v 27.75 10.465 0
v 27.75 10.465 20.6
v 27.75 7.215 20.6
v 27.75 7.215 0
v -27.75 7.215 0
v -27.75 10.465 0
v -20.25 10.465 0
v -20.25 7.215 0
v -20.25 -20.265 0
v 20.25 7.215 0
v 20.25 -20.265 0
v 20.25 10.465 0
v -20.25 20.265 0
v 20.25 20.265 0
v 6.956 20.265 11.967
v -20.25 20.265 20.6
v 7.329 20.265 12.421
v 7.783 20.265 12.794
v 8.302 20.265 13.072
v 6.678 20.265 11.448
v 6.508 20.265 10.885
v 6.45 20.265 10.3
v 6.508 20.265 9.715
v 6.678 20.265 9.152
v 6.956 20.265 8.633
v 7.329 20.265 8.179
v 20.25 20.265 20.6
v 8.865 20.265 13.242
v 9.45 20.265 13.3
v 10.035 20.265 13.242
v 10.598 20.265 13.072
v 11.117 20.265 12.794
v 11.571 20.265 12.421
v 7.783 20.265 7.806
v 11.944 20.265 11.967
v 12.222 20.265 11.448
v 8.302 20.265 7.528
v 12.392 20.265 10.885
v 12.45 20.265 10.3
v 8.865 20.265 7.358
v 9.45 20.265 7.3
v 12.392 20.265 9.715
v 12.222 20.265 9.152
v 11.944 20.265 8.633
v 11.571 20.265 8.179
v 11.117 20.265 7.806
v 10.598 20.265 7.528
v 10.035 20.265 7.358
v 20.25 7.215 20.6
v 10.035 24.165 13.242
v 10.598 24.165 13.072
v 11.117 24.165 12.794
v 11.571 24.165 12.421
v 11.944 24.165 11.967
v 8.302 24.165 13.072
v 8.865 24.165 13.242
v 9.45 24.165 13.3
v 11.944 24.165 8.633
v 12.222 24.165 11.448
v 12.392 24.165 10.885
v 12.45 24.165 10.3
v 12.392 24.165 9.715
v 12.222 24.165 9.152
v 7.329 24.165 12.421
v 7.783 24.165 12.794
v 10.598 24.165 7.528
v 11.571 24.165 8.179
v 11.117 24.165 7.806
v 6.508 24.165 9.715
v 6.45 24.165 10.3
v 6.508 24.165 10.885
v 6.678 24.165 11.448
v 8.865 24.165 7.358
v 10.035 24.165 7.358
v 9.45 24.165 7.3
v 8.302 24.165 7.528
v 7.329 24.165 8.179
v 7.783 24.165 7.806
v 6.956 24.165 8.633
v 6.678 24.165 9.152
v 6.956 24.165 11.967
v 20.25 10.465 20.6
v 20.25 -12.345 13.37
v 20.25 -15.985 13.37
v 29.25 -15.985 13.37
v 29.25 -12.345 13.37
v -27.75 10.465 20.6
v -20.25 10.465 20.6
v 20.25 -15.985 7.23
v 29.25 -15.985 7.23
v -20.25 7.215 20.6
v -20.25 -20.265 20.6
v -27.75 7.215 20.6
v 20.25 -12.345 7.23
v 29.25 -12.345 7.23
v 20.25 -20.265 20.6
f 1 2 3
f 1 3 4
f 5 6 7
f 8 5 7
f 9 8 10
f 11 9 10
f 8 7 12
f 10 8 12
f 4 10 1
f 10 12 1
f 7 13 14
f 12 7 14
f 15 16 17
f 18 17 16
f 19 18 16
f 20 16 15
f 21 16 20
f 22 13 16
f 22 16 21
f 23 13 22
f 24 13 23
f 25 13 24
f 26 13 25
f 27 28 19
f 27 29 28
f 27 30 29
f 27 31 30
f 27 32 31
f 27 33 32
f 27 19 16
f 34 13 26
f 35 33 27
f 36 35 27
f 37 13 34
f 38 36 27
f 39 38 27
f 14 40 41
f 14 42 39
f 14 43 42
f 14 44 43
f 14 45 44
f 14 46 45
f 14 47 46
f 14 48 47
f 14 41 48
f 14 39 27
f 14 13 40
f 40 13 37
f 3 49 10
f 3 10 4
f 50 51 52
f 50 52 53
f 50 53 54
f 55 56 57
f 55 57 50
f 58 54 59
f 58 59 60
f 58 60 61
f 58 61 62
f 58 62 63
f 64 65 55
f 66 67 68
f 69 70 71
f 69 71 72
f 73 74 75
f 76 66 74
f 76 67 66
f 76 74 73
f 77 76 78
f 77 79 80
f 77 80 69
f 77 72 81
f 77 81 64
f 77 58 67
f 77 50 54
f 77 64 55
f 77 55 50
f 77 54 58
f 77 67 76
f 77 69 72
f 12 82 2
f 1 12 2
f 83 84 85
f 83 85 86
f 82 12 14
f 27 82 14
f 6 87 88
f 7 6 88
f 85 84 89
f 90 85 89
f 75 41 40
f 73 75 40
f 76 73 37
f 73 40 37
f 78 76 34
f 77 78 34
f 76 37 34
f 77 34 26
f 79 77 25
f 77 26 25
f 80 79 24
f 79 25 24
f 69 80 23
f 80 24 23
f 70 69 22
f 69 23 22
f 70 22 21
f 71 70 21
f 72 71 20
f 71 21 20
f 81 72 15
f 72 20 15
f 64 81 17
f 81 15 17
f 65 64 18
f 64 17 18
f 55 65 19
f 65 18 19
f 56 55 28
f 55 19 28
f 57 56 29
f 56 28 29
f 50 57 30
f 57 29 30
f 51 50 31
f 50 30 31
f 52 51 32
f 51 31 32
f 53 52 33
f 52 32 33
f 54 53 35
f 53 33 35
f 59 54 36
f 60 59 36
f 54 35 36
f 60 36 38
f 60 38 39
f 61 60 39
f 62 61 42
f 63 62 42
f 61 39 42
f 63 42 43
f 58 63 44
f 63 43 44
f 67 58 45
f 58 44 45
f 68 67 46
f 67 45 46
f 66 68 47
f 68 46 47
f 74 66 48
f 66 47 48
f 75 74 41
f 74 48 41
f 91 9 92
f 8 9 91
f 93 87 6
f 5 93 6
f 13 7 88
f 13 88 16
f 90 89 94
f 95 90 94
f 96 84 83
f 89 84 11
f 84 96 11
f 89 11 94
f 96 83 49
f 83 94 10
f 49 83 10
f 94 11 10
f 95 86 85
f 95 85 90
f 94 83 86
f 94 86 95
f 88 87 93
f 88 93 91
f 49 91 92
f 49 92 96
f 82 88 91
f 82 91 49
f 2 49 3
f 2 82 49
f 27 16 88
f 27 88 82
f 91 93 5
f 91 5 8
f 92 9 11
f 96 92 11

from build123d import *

# Parameters (mm, degrees)
SKETCH1_W           = 40.5
SKETCH1_H           = 40.53
BOSS_EXTRUDE1_DEPTH = 20.6
BOSS_EXTRUDE2_START = -9.8
SKETCH2_W           = 7.5
SKETCH2_H           = 20.6
BOSS_EXTRUDE2_DEPTH = 3.25
SKETCH3_R           = 3
BOSS_EXTRUDE3_DEPTH = 3.9
SKETCH4_W           = 6.14
SKETCH4_H           = 3.64
BOSS_EXTRUDE4_DEPTH = 9


with BuildPart() as part:
    # Sketch1 → Boss-Extrude1 (new body)
    with BuildSketch(Plane.XY):
        Rectangle(SKETCH1_W, SKETCH1_H)
    extrude(amount=BOSS_EXTRUDE1_DEPTH)

    # Sketch2 → Boss-Extrude2 (add)
    with BuildSketch(Plane(origin=(0, 20.265, 0), x_dir=(1, 0, 0), z_dir=(0, 1, 0)).offset(BOSS_EXTRUDE2_START)):
        with Locations((-24, -10.3)):
            Rectangle(SKETCH2_W, SKETCH2_H)
        with Locations((24, -10.3)):
            Rectangle(SKETCH2_W, SKETCH2_H)
    extrude(amount=-BOSS_EXTRUDE2_DEPTH)

    # Sketch3 → Boss-Extrude3 (add)
    with BuildSketch(Plane(origin=(0, 20.265, 0), x_dir=(1, 0, 0), z_dir=(0, 1, 0))):
        with Locations(Location((9.45, -10.3, 0), (0, 0, 90))):
            Circle(SKETCH3_R)
    extrude(amount=BOSS_EXTRUDE3_DEPTH)

    # Sketch4 → Boss-Extrude4 (add)
    with BuildSketch(Plane(origin=(20.25, 0, 0), x_dir=(0, 0, -1), z_dir=(1, 0, 0))):
        with Locations((-10.3, -14.165)):
            Rectangle(SKETCH4_W, SKETCH4_H)
    extrude(amount=BOSS_EXTRUDE4_DEPTH)


solid = part.part
